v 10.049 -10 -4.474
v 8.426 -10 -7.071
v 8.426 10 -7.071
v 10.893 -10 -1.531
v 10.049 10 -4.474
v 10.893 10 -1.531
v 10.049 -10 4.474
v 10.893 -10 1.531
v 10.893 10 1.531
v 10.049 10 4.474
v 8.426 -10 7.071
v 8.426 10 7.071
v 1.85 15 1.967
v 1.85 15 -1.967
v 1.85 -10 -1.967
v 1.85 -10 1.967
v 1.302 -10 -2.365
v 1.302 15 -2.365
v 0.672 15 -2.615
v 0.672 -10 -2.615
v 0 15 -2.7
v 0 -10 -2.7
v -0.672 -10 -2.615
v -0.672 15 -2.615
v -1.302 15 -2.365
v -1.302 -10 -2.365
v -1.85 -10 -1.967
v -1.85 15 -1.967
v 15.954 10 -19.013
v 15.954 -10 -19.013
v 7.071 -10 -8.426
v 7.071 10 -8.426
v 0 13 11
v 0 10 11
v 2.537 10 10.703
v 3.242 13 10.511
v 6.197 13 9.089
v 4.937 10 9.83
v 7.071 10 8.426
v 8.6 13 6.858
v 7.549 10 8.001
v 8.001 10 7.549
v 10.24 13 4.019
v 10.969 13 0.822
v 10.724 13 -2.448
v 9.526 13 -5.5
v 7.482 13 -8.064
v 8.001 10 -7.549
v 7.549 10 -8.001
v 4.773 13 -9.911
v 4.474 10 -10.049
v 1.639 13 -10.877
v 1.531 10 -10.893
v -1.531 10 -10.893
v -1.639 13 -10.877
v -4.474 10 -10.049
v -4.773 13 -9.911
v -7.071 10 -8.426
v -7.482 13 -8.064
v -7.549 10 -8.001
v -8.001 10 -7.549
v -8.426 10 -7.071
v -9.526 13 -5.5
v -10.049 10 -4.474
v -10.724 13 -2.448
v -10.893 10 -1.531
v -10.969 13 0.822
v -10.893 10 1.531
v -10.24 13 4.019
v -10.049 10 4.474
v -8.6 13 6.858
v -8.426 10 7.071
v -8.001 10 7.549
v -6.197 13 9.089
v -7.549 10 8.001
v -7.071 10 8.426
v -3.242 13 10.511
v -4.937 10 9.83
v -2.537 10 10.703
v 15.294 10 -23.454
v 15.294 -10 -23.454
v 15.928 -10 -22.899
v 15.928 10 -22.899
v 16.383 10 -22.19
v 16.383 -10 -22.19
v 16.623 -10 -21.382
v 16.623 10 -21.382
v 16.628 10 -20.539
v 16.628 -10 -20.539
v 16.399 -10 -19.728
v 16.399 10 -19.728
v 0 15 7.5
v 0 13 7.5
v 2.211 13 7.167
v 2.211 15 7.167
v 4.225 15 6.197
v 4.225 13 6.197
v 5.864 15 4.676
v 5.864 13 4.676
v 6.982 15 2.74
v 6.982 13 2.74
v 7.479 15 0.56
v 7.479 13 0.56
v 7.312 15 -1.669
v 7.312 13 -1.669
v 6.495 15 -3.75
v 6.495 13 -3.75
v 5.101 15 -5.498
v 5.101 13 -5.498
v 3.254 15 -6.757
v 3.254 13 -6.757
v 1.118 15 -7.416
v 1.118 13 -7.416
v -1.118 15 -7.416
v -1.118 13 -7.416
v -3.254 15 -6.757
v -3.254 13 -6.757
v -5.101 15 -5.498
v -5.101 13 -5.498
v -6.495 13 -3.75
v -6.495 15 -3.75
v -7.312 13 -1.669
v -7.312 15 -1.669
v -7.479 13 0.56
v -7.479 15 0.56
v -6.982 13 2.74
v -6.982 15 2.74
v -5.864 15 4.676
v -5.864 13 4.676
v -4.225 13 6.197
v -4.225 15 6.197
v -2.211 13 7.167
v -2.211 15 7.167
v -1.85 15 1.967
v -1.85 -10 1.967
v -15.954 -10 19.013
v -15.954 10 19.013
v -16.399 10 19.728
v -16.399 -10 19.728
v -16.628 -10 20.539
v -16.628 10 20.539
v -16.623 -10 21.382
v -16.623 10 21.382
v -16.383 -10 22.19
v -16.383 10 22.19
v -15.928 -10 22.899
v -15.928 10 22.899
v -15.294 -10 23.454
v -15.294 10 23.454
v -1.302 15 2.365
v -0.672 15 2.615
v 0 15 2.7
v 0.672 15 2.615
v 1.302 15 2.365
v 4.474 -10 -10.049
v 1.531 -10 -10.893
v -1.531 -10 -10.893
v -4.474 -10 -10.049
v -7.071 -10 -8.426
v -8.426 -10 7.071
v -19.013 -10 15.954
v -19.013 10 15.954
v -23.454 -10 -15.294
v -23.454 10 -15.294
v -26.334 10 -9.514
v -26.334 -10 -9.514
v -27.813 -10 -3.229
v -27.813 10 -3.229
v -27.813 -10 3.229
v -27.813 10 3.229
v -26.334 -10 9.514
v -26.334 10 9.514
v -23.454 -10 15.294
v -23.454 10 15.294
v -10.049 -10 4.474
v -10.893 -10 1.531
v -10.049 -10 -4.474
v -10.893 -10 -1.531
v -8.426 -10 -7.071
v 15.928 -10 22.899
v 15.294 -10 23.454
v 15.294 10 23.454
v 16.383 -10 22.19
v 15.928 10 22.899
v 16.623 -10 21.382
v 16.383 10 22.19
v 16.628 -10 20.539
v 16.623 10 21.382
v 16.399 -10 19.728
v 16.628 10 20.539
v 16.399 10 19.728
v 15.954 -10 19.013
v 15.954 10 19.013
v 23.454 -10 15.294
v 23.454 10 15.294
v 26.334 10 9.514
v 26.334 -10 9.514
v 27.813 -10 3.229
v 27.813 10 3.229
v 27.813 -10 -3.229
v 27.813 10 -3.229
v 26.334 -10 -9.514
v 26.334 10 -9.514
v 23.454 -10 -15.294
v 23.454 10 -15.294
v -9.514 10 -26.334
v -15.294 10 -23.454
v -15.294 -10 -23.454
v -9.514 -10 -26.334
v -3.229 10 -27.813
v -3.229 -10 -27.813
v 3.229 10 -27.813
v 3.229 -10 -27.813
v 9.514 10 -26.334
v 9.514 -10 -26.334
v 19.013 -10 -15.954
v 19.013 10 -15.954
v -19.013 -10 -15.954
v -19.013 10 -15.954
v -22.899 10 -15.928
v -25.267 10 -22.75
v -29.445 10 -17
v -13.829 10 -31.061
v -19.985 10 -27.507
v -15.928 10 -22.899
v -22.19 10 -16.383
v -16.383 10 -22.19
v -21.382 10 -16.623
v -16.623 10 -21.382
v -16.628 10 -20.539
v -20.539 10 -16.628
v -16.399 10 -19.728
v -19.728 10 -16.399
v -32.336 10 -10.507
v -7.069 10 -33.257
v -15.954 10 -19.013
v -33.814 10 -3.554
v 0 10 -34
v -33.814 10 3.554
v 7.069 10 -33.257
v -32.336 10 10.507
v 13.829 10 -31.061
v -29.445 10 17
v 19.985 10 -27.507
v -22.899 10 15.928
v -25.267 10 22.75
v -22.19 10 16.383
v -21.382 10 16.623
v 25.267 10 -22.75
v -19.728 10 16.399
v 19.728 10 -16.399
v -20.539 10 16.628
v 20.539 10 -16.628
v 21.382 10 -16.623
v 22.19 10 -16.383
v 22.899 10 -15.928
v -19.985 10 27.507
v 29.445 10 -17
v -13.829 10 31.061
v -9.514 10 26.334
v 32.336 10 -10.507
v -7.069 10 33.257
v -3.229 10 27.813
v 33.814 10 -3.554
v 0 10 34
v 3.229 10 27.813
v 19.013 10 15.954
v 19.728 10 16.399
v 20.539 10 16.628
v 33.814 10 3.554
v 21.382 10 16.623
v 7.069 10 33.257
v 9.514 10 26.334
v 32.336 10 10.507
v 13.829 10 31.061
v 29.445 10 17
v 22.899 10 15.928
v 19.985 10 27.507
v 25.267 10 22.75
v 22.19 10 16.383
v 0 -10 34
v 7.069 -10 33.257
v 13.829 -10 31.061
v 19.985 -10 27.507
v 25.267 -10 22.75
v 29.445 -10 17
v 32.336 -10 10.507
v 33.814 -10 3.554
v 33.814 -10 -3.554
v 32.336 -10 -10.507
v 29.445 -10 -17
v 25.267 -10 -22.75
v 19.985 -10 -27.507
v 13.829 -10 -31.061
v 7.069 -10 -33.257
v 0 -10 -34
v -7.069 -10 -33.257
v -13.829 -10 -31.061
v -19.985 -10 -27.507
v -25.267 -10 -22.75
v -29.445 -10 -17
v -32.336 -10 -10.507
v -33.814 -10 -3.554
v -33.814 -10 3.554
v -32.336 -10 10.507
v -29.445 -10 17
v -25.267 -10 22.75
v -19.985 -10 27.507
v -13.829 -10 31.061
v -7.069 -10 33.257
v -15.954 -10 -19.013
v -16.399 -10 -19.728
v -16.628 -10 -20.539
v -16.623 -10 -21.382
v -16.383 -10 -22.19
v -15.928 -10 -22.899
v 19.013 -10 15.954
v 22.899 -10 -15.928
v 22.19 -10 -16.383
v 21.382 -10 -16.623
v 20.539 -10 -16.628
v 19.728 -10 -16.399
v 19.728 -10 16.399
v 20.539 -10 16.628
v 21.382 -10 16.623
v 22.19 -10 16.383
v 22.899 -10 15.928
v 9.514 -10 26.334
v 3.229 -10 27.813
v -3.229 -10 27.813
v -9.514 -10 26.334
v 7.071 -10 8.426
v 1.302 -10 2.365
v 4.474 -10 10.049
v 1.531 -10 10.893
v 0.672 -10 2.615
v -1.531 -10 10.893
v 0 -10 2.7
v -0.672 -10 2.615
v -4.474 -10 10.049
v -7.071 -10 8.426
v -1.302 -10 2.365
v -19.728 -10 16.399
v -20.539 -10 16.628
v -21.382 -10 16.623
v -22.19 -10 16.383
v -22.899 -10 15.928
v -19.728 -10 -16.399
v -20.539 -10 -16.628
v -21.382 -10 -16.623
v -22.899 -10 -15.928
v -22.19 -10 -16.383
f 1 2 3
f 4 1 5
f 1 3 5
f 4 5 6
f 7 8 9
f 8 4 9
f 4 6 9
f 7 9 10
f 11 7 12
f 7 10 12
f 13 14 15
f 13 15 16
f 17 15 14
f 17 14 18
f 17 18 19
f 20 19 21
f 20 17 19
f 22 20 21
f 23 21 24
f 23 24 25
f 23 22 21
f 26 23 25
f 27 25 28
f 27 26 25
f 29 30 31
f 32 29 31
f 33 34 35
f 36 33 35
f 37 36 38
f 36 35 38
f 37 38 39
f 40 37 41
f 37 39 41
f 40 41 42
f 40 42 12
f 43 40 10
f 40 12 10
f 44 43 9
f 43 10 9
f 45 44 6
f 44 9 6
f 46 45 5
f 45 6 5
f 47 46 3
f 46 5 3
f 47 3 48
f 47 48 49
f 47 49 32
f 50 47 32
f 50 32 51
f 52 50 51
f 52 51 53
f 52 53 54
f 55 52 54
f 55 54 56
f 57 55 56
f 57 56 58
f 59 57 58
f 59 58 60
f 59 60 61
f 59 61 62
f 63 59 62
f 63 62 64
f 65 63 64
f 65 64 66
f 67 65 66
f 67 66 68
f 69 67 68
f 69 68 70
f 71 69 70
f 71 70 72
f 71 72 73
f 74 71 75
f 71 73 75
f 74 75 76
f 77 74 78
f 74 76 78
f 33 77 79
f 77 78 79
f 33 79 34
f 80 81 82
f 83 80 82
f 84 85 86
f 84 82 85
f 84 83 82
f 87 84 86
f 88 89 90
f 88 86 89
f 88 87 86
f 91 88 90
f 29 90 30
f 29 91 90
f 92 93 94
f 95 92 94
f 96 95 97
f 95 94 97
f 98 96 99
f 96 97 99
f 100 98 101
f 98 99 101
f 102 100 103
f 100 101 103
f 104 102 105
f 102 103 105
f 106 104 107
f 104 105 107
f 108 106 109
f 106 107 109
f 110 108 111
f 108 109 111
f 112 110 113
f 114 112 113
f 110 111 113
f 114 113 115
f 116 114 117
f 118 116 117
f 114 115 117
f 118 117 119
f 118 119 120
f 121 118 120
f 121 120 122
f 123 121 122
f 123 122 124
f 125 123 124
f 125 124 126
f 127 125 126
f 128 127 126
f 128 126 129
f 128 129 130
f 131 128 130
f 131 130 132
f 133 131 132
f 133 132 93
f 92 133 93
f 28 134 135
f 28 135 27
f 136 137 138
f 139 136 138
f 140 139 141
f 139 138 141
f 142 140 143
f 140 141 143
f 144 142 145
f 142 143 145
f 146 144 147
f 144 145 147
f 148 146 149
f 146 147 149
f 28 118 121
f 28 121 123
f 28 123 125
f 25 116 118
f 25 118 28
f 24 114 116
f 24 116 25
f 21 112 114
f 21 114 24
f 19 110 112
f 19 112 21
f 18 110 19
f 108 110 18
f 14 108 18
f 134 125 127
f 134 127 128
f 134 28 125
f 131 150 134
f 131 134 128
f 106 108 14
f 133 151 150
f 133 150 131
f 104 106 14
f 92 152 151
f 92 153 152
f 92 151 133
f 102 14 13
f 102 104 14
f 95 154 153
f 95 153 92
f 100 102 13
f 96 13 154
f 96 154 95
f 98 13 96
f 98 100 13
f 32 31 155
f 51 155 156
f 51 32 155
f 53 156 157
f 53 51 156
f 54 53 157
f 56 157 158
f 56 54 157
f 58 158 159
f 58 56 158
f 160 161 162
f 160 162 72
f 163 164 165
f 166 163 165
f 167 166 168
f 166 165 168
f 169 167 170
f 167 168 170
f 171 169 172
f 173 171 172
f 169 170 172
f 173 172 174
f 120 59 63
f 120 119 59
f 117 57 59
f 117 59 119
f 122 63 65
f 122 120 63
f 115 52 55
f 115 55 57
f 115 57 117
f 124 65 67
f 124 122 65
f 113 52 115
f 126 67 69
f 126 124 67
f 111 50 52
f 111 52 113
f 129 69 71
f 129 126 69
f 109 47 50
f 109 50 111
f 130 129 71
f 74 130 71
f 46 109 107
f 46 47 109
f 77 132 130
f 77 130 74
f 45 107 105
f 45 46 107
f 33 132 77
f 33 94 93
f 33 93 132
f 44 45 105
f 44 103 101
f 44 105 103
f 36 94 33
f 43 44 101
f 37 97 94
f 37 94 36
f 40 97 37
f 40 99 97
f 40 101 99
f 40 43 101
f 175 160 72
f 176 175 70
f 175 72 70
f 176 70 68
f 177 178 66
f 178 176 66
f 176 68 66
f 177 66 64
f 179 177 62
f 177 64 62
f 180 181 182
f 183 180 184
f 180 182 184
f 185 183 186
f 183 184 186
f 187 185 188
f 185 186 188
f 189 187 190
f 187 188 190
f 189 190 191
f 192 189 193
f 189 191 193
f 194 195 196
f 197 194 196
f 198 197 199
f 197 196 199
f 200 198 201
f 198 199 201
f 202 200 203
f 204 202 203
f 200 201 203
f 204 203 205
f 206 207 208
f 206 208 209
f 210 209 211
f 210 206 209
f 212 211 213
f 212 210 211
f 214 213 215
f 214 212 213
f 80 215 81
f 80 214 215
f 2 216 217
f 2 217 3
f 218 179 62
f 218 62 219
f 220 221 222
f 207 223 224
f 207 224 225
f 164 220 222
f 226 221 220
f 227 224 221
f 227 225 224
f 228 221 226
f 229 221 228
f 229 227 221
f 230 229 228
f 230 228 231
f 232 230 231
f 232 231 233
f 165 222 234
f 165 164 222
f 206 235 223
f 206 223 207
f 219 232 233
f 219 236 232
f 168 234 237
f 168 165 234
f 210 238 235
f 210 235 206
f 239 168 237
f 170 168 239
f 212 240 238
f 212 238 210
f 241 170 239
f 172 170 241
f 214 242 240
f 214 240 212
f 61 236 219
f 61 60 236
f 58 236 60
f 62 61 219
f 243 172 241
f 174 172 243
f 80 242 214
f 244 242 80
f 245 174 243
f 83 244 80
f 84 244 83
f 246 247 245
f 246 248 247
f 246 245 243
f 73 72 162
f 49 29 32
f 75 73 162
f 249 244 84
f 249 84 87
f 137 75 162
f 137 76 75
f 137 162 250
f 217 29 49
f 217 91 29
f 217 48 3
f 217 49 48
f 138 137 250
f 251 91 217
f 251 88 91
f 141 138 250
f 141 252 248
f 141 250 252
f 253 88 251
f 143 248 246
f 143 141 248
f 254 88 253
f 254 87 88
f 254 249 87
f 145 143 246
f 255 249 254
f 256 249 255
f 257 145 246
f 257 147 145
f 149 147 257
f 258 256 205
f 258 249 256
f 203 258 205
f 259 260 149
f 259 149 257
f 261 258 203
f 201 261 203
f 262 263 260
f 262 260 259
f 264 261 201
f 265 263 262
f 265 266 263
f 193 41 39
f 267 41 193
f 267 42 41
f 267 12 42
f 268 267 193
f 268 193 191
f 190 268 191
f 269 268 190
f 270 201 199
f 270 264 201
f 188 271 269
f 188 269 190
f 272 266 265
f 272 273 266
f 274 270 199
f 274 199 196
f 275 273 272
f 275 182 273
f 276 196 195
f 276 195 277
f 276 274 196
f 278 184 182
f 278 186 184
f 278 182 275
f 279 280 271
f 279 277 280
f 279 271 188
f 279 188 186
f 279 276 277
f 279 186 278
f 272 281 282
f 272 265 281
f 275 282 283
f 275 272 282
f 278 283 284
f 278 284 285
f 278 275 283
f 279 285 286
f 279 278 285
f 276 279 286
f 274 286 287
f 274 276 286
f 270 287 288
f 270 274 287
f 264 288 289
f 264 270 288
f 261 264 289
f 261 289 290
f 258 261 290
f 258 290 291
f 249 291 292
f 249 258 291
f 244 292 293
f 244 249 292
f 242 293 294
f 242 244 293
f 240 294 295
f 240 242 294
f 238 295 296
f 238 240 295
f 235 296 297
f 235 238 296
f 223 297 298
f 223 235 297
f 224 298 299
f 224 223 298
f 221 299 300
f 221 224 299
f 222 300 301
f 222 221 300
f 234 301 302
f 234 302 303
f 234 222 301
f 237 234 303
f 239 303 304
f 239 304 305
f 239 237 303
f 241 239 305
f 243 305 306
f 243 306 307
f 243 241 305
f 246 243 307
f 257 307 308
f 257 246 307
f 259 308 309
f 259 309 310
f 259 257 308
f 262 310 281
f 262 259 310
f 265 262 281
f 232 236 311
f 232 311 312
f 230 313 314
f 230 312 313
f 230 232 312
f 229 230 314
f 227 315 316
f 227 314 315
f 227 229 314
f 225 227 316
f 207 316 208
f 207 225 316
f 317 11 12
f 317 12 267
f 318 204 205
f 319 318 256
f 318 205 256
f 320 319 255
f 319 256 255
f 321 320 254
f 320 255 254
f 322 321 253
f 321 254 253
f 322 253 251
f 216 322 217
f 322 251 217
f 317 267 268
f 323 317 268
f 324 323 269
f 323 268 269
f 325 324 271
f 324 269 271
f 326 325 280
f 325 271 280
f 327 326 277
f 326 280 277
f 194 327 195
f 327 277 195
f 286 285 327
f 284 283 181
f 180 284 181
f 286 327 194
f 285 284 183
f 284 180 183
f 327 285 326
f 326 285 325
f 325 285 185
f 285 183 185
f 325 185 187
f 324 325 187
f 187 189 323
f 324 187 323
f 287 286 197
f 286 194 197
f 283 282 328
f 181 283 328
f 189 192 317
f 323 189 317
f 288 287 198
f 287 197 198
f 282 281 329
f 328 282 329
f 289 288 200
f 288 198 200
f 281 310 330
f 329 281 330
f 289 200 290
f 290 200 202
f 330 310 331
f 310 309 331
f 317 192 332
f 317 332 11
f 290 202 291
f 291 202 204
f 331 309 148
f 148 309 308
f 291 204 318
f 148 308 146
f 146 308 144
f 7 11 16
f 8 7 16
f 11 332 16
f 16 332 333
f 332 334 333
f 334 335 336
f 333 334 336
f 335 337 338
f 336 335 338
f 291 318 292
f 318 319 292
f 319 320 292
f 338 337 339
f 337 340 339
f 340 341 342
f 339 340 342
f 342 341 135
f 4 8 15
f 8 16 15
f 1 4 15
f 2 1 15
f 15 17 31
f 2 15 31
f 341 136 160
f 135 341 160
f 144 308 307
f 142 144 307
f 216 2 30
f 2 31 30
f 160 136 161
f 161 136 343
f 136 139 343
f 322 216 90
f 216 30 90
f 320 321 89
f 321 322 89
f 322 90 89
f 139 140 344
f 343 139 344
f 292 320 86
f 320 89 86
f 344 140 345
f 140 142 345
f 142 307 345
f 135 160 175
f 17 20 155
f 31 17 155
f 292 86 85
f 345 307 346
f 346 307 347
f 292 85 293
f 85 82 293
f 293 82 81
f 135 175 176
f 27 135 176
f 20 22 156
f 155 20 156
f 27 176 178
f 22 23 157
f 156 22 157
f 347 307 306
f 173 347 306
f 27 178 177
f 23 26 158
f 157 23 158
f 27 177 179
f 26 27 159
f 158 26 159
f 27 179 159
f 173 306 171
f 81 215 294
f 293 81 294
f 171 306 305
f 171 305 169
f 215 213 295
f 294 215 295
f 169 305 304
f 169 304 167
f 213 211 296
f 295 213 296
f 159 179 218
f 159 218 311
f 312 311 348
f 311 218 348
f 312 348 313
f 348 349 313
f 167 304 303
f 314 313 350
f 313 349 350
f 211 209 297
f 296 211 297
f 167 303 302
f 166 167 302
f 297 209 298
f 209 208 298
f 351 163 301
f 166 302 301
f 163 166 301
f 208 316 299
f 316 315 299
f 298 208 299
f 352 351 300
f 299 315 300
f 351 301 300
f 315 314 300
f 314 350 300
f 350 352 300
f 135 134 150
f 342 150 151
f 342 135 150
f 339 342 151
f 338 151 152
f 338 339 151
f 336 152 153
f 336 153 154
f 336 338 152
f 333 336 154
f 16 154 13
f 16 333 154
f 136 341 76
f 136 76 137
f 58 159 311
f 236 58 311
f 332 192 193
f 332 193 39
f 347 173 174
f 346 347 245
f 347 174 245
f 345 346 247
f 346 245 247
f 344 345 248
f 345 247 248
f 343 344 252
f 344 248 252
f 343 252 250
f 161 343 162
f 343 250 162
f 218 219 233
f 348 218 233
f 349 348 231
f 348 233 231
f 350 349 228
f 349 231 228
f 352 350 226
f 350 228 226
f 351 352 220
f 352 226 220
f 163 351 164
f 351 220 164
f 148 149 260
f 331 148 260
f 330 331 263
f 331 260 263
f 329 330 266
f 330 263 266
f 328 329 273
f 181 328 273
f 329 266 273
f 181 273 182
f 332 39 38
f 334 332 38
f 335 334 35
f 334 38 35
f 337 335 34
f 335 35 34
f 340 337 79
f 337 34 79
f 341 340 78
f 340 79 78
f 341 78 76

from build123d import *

# Parameters (mm, degrees)
SKETCH_1_R          = 34
SKETCH_1_R_2        = 11
EXTRUDE_1_DEPTH     = 10
SKETCH_1_3_R        = 11
SKETCH_1_3_R_2      = 7.5
EXTRUDE_2_DEPTH     = 13
SKETCH_1_4_R        = 7.5
SKETCH_1_4_R_2      = 2.7
EXTRUDE_3_DEPTH     = 15
EXTRUDE_START       = -10
SKETCH_1_6_R        = 11
SKETCH_1_6_R_2      = 7.5
SKETCH_1_6_R_3      = 2.7
EXTRUDE_4_DEPTH     = 10
CUT_EXTRUDE_1_DEPTH = 53.076866265


with BuildPart() as part:
    # 草图1 → 凸台-拉伸1 (new, symmetric)
    with BuildSketch(Plane(origin=(0, 0, 0), x_dir=(1, 0, 0), z_dir=(0, 1, 0))):
        with Locations(Location((0, 0, 0), (0, 0, 270))):
            Circle(SKETCH_1_R)
        with Locations(Location((0, 0, 0), (0, 0, 270))):
            Circle(SKETCH_1_R_2, mode=Mode.SUBTRACT)
    extrude(amount=EXTRUDE_1_DEPTH, both=True)

    # 草图1<3> → 凸台-拉伸2 (add)
    with BuildSketch(Plane(origin=(0, 0, 0), x_dir=(1, 0, 0), z_dir=(0, 1, 0))):
        with Locations(Location((0, 0, 0), (0, 0, 270))):
            Circle(SKETCH_1_3_R)
        with Locations(Location((0, 0, 0), (0, 0, 90))):
            Circle(SKETCH_1_3_R_2, mode=Mode.SUBTRACT)
    extrude(amount=EXTRUDE_2_DEPTH)

    # 草图1<4> → 凸台-拉伸3 (add)
    # profile 1 of 3: a face of its own
    with BuildSketch(Plane(origin=(0, 0, 0), x_dir=(1, 0, 0), z_dir=(0, 1, 0))):
        with Locations(Location((0, 0, 0), (0, 0, 270))):
            Circle(SKETCH_1_4_R)
        Circle(SKETCH_1_4_R_2, mode=Mode.SUBTRACT)
    # profile 2 of 3: a face of its own
    with BuildSketch(Plane(origin=(0, 0, 0), x_dir=(1, 0, 0), z_dir=(0, 1, 0))):
        with BuildLine():
            ThreePointArc((2.7, 0), (2.478406746, 1.071214264), (1.85, 1.966596044))
            Line((1.85, 1.966596044), (1.85, -1.966596044))
            ThreePointArc((1.85, -1.966596044), (2.478406746, -1.071214264), (2.7, 0))
        make_face()
    # profile 3 of 3: a face of its own
    with BuildSketch(Plane(origin=(0, 0, 0), x_dir=(1, 0, 0), z_dir=(0, 1, 0))):
        with BuildLine():
            Line((-1.85, -1.966596044), (-1.85, 1.966596044))
            ThreePointArc((-1.85, 1.966596044), (-2.7, 0), (-1.85, -1.966596044))
        make_face()
    extrude(amount=EXTRUDE_3_DEPTH)

    # 草图1<6> → 凸台-拉伸4 (add)
    # profile 1 of 4: a face of its own
    with BuildSketch(Plane(origin=(0, 0, 0), x_dir=(1, 0, 0), z_dir=(0, 1, 0)).offset(EXTRUDE_START)):
        with Locations(Location((0, 0, 0), (0, 0, 90))):
            Circle(SKETCH_1_6_R)
        with Locations(Location((0, 0, 0), (0, 0, 270))):
            Circle(SKETCH_1_6_R_2, mode=Mode.SUBTRACT)
    # profile 2 of 4: a face of its own
    with BuildSketch(Plane(origin=(0, 0, 0), x_dir=(1, 0, 0), z_dir=(0, 1, 0)).offset(EXTRUDE_START)):
        with Locations(Location((0, 0, 0), (0, 0, 270))):
            Circle(SKETCH_1_6_R_2)
        Circle(SKETCH_1_6_R_3, mode=Mode.SUBTRACT)
    # profile 3 of 4: a face of its own
    with BuildSketch(Plane(origin=(0, 0, 0), x_dir=(1, 0, 0), z_dir=(0, 1, 0)).offset(EXTRUDE_START)):
        with BuildLine():
            Line((-1.85, -1.966596044), (-1.85, 1.966596044))
            ThreePointArc((-1.85, 1.966596044), (-2.7, 0), (-1.85, -1.966596044))
        make_face()
    # profile 4 of 4: a face of its own
    with BuildSketch(Plane(origin=(0, 0, 0), x_dir=(1, 0, 0), z_dir=(0, 1, 0)).offset(EXTRUDE_START)):
        with BuildLine():
            ThreePointArc((2.7, 0), (2.478406746, 1.071214264), (1.85, 1.966596044))
            Line((1.85, 1.966596044), (1.85, -1.966596044))
            ThreePointArc((1.85, -1.966596044), (2.478406746, -1.071214264), (2.7, 0))
        make_face()
    extrude(amount=EXTRUDE_4_DEPTH)

    # 草图2 → 切除-拉伸1 (cut, through all)
    with BuildSketch(Plane(origin=(0, 10, 0), x_dir=(1, 0, 0), z_dir=(0, 1, 0))):
        with BuildLine():
            Line((-7.070663707, 8.426488874), (-15.95356892, 19.012723075))
            ThreePointArc((-15.95356892, 19.012723075), (-16.62289939, 21.381720221), (-15.294087861, 23.454016212))
            ThreePointArc((-15.294087861, 23.454016212), (0, 28), (15.294087861, 23.454016212))
            ThreePointArc((15.294087861, 23.454016212), (16.62289939, 21.381720221), (15.95356892, 19.012723075))
            Line((15.95356892, 19.012723075), (7.070663707, 8.426488874))
            ThreePointArc((7.070663707, 8.426488874), (0, 11), (-7.070663707, 8.426488874))
        make_face()
        with BuildLine():
            Line((8.426488874, -7.070663707), (19.012723075, -15.95356892))
            ThreePointArc((19.012723075, -15.95356892), (21.381720221, -16.62289939), (23.454016212, -15.294087861))
            ThreePointArc((23.454016212, -15.294087861), (28, 0), (23.454016212, 15.294087861))
            ThreePointArc((23.454016212, 15.294087861), (21.381720221, 16.62289939), (19.012723075, 15.95356892))
            Line((19.012723075, 15.95356892), (8.426488874, 7.070663707))
            ThreePointArc((8.426488874, 7.070663707), (11, 0), (8.426488874, -7.070663707))
        make_face()
        with BuildLine():
            Line((-7.070663707, -8.426488874), (-15.95356892, -19.012723075))
            ThreePointArc((-15.95356892, -19.012723075), (-16.62289939, -21.381720221), (-15.294087861, -23.454016212))
            ThreePointArc((-15.294087861, -23.454016212), (0, -28), (15.294087861, -23.454016212))
            ThreePointArc((15.294087861, -23.454016212), (16.62289939, -21.381720221), (15.95356892, -19.012723075))
            Line((15.95356892, -19.012723075), (7.070663707, -8.426488874))
            ThreePointArc((7.070663707, -8.426488874), (0, -11), (-7.070663707, -8.426488874))
        make_face()
        with BuildLine():
            Line((-8.426488874, 7.070663707), (-19.012723075, 15.95356892))
            ThreePointArc((-19.012723075, 15.95356892), (-21.381720221, 16.62289939), (-23.454016212, 15.294087861))
            ThreePointArc((-23.454016212, 15.294087861), (-28, 0), (-23.454016212, -15.294087861))
            ThreePointArc((-23.454016212, -15.294087861), (-21.381720221, -16.62289939), (-19.012723075, -15.95356892))
            Line((-19.012723075, -15.95356892), (-8.426488874, -7.070663707))
            ThreePointArc((-8.426488874, -7.070663707), (-11, 0), (-8.426488874, 7.070663707))
        make_face()
    extrude(amount=-CUT_EXTRUDE_1_DEPTH, mode=Mode.SUBTRACT)


solid = part.part
